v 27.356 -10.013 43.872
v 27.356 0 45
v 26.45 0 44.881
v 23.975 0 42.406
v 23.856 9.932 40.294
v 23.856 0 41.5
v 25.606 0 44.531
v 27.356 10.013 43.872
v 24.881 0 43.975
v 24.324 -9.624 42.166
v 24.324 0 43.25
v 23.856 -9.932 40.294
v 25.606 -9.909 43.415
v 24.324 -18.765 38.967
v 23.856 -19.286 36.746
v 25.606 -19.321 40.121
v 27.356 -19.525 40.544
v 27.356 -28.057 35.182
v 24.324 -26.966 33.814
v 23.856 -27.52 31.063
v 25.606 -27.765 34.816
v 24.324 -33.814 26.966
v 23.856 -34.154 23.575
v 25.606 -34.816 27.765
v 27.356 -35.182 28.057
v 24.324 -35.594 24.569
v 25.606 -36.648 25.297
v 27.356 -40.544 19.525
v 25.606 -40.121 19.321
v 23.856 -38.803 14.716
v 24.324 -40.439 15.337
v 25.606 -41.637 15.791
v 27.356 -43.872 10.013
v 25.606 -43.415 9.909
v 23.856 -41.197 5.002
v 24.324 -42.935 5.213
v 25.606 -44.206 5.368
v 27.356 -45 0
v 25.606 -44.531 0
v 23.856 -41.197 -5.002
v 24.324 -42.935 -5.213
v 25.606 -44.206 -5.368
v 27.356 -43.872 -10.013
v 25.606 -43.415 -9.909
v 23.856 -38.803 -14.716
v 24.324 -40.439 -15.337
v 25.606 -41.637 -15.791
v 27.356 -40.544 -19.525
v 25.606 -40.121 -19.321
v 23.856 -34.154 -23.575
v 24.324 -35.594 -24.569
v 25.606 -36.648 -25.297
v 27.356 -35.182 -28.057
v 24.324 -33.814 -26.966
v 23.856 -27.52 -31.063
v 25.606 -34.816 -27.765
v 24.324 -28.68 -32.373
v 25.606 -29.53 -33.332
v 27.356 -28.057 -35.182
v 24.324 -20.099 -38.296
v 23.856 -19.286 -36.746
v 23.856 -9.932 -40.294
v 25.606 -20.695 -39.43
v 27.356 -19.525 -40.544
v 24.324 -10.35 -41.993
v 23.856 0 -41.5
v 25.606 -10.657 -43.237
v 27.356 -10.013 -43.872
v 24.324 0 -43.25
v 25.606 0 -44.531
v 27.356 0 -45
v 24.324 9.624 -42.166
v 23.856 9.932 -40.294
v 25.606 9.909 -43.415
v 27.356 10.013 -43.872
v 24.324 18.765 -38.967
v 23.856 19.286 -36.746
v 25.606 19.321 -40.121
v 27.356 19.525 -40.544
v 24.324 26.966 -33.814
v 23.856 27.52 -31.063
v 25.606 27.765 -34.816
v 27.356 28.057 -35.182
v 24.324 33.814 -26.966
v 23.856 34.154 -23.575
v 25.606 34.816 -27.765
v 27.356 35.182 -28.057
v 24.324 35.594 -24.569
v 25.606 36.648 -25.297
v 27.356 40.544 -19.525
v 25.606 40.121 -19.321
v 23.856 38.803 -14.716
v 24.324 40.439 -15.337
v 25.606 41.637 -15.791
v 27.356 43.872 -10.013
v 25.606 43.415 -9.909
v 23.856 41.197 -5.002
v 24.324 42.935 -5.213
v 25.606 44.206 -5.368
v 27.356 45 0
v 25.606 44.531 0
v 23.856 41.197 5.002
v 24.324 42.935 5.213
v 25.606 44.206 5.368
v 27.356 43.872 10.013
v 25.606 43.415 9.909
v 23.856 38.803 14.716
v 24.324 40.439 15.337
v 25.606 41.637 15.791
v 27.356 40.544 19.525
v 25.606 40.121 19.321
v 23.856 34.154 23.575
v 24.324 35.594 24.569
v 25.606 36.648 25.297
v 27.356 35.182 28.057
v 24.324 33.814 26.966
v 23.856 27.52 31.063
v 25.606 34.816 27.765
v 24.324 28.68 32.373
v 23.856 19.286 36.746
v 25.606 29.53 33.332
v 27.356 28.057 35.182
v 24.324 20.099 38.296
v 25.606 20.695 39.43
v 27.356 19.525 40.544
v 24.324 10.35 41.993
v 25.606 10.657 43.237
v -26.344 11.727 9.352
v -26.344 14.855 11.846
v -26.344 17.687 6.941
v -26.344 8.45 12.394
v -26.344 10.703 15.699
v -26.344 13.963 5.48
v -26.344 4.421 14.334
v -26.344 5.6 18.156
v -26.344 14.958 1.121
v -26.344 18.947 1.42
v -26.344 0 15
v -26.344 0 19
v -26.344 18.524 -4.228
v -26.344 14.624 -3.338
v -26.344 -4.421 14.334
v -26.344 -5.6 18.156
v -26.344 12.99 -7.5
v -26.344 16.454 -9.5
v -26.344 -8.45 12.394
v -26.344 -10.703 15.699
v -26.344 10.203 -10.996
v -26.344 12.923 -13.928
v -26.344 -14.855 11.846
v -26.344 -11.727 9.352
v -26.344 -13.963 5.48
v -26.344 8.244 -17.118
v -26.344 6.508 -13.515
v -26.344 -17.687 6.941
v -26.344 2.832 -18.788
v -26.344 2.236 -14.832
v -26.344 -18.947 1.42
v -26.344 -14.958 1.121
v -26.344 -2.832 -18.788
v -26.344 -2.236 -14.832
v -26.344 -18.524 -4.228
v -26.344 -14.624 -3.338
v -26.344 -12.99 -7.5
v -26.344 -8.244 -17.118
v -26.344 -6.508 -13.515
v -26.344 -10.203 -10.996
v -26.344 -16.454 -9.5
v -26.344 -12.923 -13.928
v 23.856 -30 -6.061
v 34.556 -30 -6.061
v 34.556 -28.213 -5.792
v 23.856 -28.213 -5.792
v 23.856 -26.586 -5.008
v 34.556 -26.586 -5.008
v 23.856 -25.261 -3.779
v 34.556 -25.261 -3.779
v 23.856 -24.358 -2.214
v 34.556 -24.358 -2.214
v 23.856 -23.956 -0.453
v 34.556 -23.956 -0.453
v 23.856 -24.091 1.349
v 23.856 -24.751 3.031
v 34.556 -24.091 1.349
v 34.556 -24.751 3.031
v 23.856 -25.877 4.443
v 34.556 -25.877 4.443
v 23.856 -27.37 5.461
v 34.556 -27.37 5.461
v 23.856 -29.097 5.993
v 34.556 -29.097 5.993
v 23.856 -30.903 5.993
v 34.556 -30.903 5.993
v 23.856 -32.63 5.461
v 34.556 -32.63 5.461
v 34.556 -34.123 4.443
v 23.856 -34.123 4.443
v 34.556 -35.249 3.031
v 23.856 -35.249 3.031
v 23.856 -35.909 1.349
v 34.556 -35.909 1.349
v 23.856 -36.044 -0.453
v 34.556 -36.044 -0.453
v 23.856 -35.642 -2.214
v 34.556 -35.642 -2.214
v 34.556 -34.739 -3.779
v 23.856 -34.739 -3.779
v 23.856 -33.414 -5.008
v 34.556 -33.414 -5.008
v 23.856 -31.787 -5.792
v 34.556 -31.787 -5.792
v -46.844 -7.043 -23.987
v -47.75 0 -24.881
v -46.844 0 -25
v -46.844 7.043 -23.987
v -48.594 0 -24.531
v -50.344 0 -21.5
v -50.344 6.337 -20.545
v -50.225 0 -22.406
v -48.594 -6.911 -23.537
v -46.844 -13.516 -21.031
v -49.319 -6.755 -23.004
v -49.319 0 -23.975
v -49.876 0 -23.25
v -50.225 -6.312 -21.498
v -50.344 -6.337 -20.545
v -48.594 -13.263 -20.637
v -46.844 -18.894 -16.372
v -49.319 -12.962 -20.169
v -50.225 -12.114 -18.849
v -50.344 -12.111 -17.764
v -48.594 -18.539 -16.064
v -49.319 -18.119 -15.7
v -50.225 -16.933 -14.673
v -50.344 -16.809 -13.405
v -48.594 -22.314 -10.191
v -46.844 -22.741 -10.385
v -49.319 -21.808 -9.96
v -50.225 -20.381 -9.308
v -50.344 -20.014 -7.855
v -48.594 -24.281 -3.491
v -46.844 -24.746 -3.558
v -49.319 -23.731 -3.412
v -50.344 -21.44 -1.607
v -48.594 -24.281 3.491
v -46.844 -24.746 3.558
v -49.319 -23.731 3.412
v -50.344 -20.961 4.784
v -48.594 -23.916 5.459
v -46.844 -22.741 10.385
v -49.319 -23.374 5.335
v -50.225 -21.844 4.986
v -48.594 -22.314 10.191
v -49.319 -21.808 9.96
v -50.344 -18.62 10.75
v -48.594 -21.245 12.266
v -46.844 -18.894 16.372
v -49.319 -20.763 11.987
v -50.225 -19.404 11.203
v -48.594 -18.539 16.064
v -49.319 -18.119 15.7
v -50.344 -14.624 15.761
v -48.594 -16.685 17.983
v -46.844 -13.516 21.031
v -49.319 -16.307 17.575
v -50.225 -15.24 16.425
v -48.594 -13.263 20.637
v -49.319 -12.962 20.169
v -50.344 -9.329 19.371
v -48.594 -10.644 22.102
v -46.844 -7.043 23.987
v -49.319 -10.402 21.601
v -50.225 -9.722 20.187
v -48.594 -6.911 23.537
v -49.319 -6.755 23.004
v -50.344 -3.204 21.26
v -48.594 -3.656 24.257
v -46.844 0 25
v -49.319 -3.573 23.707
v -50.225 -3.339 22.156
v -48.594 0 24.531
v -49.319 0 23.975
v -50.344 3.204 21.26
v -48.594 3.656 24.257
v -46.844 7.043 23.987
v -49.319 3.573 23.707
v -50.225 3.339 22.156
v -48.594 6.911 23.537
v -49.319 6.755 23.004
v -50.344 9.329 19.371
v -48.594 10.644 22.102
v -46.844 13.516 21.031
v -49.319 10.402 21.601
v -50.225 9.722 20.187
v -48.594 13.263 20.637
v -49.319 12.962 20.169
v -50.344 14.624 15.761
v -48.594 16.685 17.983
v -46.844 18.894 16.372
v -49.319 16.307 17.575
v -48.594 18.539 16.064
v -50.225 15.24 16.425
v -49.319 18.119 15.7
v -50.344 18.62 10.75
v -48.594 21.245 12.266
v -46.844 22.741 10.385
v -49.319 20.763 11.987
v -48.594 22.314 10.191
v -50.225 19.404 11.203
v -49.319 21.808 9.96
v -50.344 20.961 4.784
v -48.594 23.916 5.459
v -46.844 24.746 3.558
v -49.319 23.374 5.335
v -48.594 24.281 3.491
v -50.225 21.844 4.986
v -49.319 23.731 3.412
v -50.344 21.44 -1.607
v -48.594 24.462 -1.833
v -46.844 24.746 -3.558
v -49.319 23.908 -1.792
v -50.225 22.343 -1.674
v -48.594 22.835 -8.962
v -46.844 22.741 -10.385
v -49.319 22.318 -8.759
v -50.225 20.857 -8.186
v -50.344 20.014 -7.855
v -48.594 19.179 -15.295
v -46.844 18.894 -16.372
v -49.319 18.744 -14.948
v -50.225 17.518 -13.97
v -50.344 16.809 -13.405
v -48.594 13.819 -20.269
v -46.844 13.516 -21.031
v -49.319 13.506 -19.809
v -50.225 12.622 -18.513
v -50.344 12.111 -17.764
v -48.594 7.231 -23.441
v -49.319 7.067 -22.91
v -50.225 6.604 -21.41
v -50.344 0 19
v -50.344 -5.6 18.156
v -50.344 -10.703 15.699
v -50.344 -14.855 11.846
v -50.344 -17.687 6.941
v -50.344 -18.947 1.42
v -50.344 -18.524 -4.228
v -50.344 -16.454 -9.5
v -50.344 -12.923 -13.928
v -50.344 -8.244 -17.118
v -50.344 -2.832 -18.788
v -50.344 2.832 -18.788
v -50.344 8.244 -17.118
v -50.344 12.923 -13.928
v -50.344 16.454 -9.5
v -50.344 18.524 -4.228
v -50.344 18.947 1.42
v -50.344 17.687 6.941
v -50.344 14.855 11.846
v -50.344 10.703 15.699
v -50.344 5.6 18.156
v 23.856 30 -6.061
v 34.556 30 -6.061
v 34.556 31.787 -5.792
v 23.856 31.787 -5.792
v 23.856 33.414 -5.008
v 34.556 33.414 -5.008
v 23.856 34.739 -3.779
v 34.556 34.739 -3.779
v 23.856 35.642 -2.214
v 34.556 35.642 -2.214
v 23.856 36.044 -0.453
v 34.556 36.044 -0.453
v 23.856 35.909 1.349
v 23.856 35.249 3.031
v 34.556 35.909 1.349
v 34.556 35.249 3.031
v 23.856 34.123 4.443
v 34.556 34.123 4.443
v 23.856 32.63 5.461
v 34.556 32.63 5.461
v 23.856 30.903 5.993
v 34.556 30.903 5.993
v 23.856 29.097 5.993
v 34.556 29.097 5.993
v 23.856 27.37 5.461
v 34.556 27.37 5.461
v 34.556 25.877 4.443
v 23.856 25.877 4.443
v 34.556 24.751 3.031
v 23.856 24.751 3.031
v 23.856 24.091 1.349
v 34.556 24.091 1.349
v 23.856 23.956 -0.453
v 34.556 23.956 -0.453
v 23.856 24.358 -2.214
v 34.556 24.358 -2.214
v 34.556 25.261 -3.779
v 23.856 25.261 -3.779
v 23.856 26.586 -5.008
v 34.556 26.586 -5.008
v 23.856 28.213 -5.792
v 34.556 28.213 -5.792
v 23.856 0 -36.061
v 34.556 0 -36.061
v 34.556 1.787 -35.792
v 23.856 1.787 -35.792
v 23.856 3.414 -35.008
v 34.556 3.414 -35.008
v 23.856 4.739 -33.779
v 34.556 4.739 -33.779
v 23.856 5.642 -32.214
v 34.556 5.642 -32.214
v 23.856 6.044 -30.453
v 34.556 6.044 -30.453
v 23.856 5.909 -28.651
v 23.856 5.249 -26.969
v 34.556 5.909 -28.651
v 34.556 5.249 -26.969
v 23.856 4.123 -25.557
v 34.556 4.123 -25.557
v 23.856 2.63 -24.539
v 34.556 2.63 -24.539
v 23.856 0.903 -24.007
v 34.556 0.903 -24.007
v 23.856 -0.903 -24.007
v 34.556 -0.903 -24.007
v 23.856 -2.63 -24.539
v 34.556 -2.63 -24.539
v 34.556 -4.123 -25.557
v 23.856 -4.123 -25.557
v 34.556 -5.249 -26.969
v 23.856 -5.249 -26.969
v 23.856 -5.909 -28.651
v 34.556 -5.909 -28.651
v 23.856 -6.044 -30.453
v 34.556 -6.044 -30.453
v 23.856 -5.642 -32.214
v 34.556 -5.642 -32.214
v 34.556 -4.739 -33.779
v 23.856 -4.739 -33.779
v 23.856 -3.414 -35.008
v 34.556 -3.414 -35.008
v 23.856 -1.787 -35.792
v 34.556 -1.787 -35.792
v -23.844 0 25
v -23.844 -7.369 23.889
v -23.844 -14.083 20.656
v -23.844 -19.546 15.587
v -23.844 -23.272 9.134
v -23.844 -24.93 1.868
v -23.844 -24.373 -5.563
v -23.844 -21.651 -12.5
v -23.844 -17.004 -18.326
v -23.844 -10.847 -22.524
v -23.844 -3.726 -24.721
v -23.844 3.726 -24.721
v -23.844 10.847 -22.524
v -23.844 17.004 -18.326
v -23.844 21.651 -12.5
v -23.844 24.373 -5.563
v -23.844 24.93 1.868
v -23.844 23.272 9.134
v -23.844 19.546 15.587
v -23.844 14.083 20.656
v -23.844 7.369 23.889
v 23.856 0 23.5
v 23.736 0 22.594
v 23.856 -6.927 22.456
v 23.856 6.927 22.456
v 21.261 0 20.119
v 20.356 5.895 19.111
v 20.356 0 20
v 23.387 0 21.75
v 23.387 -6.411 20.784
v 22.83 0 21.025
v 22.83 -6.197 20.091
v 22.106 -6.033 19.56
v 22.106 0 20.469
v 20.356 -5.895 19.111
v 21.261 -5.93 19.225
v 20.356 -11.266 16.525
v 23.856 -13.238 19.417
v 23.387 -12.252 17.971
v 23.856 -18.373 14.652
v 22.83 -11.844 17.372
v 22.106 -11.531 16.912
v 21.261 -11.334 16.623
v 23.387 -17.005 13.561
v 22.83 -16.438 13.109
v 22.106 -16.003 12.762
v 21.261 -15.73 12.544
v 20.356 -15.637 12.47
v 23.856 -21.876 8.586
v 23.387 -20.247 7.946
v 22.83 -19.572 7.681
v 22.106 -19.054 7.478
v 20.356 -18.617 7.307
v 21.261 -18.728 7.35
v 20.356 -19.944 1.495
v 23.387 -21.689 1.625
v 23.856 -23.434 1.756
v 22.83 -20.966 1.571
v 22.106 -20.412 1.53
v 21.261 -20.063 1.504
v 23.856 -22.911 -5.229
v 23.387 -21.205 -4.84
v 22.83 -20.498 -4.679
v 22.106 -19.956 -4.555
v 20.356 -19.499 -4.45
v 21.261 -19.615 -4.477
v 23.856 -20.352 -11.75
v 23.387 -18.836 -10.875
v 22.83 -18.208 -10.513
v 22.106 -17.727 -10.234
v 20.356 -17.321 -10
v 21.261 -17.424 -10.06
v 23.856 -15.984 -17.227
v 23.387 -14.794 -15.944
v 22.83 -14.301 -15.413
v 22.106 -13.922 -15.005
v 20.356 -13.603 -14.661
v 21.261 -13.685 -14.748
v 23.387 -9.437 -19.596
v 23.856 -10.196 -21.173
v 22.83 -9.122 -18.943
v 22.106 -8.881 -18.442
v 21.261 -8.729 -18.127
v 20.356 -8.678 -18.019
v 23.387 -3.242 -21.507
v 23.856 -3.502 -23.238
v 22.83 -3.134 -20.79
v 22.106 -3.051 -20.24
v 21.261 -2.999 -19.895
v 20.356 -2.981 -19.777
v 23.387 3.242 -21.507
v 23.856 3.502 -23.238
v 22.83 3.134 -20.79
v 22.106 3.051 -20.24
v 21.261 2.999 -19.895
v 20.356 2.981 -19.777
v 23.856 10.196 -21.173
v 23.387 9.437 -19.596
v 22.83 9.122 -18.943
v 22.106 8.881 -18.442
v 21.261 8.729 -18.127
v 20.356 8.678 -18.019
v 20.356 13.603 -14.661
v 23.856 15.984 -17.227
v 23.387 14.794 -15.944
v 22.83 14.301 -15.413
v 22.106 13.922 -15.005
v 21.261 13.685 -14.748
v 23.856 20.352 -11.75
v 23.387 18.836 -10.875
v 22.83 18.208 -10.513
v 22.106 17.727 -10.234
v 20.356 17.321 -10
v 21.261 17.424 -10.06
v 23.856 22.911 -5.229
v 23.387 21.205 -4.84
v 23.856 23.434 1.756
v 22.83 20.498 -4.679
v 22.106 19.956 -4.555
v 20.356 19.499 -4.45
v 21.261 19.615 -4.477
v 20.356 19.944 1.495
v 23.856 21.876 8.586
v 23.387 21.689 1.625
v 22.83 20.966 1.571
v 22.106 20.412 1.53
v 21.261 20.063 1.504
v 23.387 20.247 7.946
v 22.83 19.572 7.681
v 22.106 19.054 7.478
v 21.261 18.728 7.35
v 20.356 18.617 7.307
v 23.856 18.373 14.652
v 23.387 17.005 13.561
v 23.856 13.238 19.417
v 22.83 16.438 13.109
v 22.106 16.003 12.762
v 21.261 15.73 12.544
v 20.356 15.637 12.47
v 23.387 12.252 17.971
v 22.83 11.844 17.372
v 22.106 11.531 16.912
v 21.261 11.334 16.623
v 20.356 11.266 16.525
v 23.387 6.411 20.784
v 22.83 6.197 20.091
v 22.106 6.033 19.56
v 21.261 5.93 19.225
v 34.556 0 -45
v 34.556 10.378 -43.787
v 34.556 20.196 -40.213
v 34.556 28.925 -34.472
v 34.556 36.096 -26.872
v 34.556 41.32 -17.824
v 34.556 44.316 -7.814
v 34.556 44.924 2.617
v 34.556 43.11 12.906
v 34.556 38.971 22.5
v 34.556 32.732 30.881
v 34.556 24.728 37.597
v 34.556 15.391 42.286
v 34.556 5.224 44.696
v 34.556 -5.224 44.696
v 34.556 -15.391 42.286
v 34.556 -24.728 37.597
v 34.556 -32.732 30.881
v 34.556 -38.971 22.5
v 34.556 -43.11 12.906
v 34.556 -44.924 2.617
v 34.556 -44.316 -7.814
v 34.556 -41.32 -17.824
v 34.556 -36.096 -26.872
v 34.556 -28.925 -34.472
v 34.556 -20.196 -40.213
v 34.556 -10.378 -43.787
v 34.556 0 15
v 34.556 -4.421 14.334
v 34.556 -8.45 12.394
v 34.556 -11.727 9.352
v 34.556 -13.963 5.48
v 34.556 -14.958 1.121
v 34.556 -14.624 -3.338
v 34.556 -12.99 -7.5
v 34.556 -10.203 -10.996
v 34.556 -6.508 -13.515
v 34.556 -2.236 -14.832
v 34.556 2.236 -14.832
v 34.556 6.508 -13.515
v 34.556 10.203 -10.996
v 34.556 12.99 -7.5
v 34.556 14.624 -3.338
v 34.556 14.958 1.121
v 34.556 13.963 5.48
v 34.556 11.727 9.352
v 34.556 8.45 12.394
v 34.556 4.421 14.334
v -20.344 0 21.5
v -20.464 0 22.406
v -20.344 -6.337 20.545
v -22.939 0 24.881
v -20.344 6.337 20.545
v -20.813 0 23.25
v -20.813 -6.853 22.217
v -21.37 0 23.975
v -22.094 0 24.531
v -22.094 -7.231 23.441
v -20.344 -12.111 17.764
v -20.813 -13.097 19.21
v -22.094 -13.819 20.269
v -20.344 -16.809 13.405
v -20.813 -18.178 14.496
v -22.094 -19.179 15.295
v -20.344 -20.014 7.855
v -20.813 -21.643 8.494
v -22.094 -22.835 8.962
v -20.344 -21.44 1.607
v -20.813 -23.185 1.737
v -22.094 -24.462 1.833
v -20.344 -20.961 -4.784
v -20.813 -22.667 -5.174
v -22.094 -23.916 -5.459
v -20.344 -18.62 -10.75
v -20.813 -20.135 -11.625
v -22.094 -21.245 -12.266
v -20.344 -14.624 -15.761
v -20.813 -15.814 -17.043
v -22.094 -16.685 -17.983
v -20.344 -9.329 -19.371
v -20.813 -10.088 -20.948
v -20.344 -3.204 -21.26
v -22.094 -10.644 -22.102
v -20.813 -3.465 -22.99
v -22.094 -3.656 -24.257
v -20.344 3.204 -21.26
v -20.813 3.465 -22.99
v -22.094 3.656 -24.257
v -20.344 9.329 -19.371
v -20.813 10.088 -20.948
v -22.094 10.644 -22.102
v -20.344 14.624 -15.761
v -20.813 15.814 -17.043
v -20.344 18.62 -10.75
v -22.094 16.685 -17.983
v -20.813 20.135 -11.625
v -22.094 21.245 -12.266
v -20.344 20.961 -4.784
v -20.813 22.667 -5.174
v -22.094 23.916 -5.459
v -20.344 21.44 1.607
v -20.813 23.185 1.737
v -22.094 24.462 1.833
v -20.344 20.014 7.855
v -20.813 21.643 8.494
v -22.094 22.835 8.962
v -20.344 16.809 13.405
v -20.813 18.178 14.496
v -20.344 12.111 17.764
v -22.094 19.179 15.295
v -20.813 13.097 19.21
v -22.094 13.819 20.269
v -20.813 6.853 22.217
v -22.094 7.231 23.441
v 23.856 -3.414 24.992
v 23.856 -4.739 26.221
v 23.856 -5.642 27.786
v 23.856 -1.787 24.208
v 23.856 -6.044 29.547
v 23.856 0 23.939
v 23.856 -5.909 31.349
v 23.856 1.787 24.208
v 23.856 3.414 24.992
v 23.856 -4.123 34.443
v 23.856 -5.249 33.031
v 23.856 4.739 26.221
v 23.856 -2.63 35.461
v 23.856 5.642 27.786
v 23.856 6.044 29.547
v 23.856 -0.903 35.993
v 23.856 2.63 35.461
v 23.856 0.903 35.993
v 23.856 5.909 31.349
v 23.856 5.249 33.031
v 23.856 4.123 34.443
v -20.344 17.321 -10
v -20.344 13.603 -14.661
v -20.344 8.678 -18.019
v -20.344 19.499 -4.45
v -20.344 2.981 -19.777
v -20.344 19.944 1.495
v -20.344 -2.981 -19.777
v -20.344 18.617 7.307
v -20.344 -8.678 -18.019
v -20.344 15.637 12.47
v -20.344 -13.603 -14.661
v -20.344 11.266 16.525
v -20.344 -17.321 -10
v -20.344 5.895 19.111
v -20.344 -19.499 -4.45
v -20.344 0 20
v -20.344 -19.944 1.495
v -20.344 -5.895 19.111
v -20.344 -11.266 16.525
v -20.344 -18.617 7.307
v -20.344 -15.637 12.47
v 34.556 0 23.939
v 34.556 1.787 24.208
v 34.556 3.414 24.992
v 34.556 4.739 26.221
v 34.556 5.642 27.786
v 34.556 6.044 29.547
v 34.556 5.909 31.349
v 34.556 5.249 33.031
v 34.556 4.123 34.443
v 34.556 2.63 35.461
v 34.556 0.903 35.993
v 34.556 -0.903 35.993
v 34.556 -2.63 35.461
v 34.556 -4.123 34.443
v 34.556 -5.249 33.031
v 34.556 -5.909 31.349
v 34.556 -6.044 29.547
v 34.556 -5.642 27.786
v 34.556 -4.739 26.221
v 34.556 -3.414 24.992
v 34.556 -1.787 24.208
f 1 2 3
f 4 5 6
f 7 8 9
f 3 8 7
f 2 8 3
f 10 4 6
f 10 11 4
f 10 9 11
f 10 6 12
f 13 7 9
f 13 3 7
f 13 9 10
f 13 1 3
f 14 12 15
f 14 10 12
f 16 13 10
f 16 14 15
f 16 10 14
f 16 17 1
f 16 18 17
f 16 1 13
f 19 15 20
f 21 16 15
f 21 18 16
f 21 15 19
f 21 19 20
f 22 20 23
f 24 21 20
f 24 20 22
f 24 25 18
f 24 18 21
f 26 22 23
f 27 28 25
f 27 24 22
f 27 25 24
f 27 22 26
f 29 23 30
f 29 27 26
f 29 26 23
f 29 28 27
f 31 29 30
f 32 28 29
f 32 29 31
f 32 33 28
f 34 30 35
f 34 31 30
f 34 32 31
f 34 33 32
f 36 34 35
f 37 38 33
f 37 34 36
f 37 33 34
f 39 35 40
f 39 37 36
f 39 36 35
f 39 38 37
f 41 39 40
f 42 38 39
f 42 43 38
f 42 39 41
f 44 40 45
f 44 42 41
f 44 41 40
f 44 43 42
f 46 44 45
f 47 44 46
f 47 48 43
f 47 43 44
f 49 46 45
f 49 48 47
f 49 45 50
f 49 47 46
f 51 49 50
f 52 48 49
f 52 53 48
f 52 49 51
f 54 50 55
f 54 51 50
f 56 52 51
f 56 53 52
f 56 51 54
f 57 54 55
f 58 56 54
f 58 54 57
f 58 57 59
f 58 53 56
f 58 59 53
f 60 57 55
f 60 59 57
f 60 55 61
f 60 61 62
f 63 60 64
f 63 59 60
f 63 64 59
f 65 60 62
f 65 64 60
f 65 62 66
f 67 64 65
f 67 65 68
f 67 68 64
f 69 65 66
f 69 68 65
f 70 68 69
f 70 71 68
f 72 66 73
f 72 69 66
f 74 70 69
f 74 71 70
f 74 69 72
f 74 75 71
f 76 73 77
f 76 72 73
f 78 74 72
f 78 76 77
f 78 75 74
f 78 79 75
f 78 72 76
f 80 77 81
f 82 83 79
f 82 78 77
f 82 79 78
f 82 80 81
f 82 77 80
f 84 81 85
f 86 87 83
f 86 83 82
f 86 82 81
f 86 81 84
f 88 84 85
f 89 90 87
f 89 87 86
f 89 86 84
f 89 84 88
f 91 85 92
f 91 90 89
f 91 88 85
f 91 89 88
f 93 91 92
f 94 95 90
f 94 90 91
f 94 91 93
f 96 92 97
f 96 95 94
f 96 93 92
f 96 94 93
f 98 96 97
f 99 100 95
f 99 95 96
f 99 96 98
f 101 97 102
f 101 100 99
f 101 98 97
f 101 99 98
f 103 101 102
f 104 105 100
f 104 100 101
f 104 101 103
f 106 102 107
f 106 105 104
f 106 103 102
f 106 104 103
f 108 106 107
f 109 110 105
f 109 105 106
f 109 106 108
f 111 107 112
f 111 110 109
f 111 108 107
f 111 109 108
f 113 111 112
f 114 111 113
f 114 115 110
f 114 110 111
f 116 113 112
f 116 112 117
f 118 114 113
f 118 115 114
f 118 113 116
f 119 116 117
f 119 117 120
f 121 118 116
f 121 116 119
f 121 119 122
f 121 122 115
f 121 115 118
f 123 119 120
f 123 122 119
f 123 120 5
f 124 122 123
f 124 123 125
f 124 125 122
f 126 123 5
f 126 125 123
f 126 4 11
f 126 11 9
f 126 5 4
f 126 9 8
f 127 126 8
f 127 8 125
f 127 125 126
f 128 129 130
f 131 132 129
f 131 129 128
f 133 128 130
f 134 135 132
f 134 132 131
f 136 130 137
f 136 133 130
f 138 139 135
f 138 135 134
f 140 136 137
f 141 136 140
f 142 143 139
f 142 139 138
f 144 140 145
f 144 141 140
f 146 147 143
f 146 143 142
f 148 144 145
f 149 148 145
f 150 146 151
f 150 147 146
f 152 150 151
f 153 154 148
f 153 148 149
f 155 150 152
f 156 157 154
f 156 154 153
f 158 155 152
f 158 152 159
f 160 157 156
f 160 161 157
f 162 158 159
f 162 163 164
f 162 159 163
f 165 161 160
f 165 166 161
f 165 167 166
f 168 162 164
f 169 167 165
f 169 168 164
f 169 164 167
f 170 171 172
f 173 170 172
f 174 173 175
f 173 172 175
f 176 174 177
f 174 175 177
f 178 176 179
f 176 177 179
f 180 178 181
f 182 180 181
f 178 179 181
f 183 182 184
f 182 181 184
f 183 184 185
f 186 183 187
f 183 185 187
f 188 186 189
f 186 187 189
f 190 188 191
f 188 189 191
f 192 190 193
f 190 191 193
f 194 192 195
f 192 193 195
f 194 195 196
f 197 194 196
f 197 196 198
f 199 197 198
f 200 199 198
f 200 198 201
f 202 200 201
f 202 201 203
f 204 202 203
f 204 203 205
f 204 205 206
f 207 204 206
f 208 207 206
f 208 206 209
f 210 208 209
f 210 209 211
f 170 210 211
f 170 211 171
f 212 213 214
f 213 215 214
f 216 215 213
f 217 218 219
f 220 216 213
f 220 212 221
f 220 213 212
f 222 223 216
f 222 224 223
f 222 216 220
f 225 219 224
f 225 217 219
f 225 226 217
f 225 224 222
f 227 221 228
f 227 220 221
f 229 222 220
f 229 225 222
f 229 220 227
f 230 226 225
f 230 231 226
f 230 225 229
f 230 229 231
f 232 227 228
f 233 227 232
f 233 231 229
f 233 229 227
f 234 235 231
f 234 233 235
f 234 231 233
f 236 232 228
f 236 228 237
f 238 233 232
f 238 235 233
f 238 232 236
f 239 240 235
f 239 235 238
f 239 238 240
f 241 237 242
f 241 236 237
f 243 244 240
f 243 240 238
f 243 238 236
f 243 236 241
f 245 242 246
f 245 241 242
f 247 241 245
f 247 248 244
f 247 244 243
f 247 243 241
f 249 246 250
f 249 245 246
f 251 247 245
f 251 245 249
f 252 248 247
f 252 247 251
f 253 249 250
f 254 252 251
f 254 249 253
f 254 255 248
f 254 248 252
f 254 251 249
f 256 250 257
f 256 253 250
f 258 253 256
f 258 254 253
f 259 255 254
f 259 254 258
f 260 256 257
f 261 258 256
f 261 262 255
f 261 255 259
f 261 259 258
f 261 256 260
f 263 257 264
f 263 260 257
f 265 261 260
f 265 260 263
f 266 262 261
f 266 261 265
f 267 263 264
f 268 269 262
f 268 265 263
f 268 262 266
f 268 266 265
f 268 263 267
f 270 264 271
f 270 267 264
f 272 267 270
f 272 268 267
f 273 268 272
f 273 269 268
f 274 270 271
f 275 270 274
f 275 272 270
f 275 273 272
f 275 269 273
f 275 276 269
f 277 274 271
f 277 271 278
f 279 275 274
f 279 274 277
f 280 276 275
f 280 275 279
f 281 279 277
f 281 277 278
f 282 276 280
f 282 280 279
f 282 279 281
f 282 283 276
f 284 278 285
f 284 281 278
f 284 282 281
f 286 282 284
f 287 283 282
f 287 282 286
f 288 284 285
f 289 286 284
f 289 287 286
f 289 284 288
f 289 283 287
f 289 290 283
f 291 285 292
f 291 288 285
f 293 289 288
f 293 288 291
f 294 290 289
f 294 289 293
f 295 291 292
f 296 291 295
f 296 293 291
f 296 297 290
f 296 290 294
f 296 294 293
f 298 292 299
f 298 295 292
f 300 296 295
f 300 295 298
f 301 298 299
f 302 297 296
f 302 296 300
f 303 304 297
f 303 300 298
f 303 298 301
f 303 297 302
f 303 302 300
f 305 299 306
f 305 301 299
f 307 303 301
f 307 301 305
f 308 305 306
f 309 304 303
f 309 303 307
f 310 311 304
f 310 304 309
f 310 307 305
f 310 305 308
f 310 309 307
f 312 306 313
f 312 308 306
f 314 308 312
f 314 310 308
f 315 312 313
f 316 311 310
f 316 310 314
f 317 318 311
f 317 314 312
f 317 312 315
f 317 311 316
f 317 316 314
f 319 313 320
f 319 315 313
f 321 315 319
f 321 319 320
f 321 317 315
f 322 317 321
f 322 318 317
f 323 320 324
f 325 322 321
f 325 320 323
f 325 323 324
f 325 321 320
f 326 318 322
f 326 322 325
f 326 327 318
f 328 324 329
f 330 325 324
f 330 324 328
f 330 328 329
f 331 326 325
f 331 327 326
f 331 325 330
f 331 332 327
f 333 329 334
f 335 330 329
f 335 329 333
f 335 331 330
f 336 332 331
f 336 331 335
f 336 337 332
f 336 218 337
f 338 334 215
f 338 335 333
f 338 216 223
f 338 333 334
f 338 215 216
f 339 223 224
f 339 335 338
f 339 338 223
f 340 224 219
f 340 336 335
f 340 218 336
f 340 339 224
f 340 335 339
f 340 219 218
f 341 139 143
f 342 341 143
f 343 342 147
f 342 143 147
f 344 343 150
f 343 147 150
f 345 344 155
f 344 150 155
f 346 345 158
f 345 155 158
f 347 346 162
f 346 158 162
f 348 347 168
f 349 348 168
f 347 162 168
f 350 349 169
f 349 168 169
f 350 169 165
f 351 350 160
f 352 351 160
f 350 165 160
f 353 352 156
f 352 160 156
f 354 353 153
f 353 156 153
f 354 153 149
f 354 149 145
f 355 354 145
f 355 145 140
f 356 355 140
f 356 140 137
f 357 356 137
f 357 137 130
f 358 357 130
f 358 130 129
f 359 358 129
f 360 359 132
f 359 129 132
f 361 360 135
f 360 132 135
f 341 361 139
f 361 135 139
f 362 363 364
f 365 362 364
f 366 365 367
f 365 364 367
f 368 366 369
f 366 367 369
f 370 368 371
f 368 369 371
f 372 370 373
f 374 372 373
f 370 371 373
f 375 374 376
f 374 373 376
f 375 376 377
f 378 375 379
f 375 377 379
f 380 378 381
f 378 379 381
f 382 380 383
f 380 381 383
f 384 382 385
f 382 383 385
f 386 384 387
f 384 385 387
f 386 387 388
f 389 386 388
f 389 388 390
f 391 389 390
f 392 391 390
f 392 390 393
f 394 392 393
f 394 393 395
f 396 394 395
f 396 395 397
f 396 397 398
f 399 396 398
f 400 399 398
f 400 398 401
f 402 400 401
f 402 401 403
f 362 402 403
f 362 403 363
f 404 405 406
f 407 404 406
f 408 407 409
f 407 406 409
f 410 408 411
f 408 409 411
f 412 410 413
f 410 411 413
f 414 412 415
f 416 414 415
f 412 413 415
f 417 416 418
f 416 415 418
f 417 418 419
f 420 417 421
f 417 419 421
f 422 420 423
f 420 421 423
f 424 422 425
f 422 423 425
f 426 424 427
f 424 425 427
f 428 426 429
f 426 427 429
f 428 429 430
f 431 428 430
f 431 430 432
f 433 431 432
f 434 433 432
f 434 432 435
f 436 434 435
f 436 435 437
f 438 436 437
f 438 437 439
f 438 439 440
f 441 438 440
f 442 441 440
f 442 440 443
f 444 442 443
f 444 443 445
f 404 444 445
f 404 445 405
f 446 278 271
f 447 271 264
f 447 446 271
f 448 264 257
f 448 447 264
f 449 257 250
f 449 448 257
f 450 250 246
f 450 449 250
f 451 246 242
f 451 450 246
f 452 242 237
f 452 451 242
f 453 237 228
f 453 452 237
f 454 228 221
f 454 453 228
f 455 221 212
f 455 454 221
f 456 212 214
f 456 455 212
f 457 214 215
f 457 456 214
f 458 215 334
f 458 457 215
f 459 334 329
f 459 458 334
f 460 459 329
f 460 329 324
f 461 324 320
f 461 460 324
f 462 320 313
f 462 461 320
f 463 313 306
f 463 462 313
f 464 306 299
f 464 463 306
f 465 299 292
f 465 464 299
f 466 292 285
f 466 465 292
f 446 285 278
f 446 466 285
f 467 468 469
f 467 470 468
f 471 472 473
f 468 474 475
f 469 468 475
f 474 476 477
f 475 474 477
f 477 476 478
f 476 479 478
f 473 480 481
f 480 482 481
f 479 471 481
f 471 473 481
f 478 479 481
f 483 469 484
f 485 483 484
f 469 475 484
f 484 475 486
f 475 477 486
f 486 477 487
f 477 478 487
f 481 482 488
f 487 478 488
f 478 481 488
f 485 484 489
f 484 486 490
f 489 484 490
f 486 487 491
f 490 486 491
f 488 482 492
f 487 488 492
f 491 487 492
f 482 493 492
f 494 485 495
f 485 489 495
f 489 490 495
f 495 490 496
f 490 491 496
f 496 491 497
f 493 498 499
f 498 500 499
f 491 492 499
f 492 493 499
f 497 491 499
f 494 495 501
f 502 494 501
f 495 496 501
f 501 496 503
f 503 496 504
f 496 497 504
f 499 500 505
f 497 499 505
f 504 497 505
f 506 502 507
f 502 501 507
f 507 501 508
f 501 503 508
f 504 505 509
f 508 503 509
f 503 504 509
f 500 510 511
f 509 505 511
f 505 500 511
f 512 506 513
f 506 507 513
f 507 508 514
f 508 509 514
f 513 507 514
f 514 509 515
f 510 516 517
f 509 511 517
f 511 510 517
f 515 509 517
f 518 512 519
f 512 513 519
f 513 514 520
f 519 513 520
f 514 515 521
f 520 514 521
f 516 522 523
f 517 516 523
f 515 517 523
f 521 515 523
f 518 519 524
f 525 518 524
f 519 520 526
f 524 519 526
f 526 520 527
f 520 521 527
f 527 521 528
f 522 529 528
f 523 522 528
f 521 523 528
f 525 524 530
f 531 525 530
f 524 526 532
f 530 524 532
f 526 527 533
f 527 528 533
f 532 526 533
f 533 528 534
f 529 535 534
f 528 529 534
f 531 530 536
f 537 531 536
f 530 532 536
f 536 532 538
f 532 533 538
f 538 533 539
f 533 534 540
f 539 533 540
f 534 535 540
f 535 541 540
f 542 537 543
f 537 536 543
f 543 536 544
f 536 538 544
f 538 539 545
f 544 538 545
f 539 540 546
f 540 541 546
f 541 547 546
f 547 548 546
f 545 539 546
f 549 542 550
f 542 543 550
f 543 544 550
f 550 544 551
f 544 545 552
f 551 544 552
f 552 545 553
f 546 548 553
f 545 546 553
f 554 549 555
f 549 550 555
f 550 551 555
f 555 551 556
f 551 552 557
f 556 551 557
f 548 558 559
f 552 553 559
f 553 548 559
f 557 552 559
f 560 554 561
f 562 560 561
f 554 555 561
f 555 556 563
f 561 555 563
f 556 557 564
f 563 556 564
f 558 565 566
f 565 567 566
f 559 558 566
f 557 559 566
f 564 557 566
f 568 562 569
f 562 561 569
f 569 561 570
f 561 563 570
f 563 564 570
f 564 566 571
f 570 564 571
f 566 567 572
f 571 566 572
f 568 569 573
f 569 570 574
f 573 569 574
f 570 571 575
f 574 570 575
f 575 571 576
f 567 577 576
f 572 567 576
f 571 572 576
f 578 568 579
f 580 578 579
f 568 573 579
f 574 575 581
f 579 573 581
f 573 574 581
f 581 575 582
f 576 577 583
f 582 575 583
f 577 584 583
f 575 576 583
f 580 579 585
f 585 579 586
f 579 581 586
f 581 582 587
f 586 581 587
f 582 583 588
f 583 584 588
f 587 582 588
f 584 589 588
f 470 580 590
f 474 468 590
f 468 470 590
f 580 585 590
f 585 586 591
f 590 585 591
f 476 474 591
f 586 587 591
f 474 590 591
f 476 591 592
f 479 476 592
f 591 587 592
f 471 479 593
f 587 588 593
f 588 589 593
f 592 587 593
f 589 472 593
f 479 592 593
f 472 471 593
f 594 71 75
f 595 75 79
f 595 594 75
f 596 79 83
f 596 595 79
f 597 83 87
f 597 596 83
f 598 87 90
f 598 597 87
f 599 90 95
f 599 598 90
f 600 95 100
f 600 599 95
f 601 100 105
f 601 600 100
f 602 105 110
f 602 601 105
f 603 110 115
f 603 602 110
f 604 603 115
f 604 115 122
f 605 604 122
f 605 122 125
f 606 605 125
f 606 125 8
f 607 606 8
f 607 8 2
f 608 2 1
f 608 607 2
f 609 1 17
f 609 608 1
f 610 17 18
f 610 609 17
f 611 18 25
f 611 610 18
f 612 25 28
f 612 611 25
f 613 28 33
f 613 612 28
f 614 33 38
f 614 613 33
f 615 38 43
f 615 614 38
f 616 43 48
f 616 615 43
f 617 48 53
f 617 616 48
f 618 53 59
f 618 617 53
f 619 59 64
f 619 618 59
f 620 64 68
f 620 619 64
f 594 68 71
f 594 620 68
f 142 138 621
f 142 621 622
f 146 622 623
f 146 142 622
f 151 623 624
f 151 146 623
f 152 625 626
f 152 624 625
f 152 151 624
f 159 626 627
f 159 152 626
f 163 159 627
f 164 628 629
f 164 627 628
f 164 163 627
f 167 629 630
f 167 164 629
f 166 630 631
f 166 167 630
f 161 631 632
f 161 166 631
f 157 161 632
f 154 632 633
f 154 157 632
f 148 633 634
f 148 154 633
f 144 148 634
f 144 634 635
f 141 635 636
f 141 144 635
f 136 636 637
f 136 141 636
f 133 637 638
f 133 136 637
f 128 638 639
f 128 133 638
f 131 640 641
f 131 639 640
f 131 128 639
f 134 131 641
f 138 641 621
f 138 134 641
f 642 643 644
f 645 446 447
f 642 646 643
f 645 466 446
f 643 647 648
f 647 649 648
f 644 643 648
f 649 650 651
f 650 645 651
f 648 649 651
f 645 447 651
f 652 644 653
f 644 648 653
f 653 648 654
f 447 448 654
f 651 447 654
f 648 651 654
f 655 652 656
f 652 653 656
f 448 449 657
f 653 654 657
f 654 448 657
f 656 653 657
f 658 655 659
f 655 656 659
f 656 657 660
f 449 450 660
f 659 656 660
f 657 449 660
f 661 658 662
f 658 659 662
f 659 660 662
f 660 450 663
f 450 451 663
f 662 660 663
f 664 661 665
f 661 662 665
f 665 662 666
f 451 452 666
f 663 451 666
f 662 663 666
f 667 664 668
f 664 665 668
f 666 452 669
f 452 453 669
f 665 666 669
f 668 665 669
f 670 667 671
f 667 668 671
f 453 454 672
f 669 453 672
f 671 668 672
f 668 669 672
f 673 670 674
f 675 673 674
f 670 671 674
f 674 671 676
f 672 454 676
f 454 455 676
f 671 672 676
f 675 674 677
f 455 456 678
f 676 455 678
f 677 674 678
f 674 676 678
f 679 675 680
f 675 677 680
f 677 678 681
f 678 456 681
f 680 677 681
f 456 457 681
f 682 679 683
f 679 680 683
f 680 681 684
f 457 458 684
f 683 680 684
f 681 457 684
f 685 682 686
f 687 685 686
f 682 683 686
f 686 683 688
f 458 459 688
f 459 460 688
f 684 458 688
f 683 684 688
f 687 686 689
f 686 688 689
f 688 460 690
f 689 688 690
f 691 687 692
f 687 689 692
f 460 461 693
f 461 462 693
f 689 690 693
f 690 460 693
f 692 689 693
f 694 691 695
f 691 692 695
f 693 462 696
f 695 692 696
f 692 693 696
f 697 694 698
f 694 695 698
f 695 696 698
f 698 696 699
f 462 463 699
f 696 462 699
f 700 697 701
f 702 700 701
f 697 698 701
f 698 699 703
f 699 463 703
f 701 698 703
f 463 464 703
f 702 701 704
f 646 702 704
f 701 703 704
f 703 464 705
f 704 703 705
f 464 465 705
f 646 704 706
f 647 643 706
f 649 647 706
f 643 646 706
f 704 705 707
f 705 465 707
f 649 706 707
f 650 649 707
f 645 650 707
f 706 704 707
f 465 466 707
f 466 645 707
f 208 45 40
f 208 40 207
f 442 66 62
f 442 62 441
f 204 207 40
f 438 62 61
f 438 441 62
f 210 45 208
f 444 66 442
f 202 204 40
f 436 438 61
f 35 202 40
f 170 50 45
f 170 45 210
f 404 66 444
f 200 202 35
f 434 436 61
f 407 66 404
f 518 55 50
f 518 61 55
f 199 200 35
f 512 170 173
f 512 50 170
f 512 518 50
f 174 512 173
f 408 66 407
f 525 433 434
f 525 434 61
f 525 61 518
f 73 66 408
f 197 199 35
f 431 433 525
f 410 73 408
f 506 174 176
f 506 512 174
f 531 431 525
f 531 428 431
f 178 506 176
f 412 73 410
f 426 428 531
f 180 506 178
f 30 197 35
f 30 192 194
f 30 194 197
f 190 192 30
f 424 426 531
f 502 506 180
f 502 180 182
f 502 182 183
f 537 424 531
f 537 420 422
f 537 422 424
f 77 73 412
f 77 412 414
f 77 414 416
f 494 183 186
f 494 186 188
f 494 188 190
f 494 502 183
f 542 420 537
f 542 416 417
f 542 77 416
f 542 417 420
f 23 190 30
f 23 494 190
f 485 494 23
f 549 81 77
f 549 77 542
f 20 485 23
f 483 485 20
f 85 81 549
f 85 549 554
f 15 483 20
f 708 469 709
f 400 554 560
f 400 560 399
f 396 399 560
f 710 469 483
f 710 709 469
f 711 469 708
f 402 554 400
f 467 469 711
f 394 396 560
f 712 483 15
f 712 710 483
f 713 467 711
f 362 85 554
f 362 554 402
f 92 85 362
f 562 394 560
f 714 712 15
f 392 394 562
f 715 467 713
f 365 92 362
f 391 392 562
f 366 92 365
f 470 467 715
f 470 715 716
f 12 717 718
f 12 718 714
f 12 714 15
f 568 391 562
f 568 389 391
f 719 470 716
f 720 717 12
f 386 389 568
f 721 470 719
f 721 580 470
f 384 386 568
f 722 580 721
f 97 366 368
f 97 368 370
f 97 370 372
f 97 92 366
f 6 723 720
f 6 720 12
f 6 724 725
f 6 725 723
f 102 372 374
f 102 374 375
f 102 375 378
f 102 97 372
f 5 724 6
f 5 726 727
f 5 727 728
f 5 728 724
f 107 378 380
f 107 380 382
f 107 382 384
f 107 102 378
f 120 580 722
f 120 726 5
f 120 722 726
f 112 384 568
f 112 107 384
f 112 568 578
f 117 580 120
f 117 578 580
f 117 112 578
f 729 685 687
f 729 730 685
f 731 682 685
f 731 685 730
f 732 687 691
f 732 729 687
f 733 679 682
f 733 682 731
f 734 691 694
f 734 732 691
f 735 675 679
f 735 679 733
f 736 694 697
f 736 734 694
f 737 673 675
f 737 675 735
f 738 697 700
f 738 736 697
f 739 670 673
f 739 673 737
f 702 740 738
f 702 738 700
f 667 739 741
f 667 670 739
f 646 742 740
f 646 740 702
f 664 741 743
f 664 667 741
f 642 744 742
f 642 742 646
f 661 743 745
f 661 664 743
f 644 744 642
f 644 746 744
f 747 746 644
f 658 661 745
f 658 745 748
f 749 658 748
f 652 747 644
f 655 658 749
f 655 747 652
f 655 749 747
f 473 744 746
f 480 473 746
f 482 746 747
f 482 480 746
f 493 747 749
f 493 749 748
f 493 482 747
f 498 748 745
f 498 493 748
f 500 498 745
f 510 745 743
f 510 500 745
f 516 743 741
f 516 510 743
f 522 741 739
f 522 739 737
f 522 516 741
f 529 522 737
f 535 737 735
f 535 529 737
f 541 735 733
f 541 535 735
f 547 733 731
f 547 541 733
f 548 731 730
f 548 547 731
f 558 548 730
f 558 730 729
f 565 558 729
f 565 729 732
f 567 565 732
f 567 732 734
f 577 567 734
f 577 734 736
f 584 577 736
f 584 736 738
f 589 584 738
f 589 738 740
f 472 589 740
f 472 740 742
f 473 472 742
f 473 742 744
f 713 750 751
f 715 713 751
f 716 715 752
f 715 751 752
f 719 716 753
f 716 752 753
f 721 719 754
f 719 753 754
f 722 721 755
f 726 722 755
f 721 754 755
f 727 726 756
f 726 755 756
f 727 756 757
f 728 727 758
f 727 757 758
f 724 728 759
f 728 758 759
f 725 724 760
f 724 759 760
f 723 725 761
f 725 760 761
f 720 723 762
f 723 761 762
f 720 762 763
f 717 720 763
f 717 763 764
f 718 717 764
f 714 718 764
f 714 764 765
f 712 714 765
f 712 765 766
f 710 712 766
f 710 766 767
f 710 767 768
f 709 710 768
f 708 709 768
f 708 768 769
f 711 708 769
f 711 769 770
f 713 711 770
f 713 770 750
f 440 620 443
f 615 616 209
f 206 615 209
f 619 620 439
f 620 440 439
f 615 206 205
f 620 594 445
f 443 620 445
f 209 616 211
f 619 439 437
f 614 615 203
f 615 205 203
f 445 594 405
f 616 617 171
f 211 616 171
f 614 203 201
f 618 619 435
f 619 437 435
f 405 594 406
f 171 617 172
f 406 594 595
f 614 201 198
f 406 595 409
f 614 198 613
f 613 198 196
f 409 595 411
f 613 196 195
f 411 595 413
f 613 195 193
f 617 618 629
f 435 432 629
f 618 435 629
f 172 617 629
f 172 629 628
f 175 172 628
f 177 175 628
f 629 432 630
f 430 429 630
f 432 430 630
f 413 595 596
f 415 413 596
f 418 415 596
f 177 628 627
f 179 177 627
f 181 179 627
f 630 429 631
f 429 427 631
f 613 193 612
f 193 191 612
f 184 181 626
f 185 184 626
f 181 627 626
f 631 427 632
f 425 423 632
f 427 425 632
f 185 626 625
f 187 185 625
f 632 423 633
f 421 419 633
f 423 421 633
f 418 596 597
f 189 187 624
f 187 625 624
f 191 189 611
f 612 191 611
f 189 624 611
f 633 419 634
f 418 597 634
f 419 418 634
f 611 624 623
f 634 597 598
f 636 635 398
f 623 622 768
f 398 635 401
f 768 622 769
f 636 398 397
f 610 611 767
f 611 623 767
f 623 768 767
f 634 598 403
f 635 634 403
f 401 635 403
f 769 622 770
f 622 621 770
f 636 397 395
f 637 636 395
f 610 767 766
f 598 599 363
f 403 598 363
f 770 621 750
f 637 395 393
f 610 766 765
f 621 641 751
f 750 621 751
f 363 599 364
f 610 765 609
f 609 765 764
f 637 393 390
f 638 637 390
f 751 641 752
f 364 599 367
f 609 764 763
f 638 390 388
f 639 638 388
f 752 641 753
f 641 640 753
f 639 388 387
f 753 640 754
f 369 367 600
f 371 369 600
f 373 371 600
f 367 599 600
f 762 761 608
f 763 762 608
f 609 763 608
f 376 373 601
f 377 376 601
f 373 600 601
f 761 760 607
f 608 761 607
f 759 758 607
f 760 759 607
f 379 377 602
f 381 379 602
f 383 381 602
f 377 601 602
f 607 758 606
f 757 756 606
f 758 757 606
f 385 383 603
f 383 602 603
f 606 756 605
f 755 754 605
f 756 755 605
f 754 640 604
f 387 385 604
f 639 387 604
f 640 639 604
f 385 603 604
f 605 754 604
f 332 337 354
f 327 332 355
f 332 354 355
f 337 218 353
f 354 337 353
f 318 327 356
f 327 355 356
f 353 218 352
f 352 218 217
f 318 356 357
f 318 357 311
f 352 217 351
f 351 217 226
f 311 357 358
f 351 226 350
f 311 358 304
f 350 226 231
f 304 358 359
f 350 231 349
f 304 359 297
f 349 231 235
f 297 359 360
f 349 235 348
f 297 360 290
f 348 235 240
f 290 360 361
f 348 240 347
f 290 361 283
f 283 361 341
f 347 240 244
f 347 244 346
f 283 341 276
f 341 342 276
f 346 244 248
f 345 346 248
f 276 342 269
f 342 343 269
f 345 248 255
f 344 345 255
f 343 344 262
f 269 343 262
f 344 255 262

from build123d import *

# Parameters (mm, degrees)
SKETCH2_W          = 10.7
SKETCH2_H          = 7.5
CUT_EXTRUDE2_REACH = 108.104
SKETCH5_R          = 6.061151683
FILLET2_R          = 3.5
FILLET3_R          = 3.5


with BuildPart() as part:
    # Sketch2 → Revolve5 (revolve)
    with BuildSketch(Plane(origin=(0, 0, 0), x_dir=(1, 0, 0), z_dir=(0, 1, 0))):
        Polygon((-50.344444444, 25), (-50.344444444, 19), (-26.344444444, 19), (-26.344444444, 15), (34.555555556, 15), (34.555555556, 25), (23.855555556, 25), (23.855555556, 20), (-20.344444444, 20), (-20.344444444, 25), align=None)
        Polygon((-26.344444444, -15), (-26.344444444, -19), (-50.344444444, -19), (-50.344444444, -25), (-20.344444444, -25), (-20.344444444, -20), (23.855555556, -20), (23.855555556, -45), (34.555555556, -45), (34.555555556, -15), align=None)
        with Locations((29.205555556, 41.25)):
            Rectangle(SKETCH2_W, SKETCH2_H)
    revolve(axis=Axis((-47.361111111, 0, 0), (1, 0, 0)))

    # Sketch5 → Cut-Extrude2 (cut, up to next)
    with BuildSketch(Plane(origin=(34.555555556, 0, 0), x_dir=(0, 0, -1), z_dir=(1, 0, 0)), mode=Mode.PRIVATE) as cut_extrude2_sk1:
        with Locations((0, 30)):
            Circle(SKETCH5_R)
    cut_extrude2_tool1 = extrude(cut_extrude2_sk1.sketch, amount=-CUT_EXTRUDE2_REACH, mode=Mode.PRIVATE) & part.part
    # Sketch5 → Cut-Extrude2 (cut, up to next)
    with BuildSketch(Plane(origin=(34.555555556, 0, 0), x_dir=(0, 0, -1), z_dir=(1, 0, 0)), mode=Mode.PRIVATE) as cut_extrude2_sk2:
        with Locations((30, 0)):
            Circle(SKETCH5_R)
    cut_extrude2_tool2 = extrude(cut_extrude2_sk2.sketch, amount=-CUT_EXTRUDE2_REACH, mode=Mode.PRIVATE) & part.part
    # Sketch5 → Cut-Extrude2 (cut, up to next)
    with BuildSketch(Plane(origin=(34.555555556, 0, 0), x_dir=(0, 0, -1), z_dir=(1, 0, 0)), mode=Mode.PRIVATE) as cut_extrude2_sk3:
        with Locations((0, -30)):
            Circle(SKETCH5_R)
    cut_extrude2_tool3 = extrude(cut_extrude2_sk3.sketch, amount=-CUT_EXTRUDE2_REACH, mode=Mode.PRIVATE) & part.part
    # Sketch5 → Cut-Extrude2 (cut, up to next)
    with BuildSketch(Plane(origin=(34.555555556, 0, 0), x_dir=(0, 0, -1), z_dir=(1, 0, 0)), mode=Mode.PRIVATE) as cut_extrude2_sk4:
        with Locations((-30, 0)):
            Circle(SKETCH5_R)
    cut_extrude2_tool4 = extrude(cut_extrude2_sk4.sketch, amount=-CUT_EXTRUDE2_REACH, mode=Mode.PRIVATE) & part.part
    add(cut_extrude2_tool1.solids().sort_by_distance((34.555556, 30, 0))[0], mode=Mode.SUBTRACT)
    add(cut_extrude2_tool2.solids().sort_by_distance((34.555556, 0, -30))[0], mode=Mode.SUBTRACT)
    add(cut_extrude2_tool3.solids().sort_by_distance((34.555556, -30, 0))[0], mode=Mode.SUBTRACT)
    add(cut_extrude2_tool4.solids().sort_by_distance((34.555556, 0, 30))[0], mode=Mode.SUBTRACT)

    # Fillet2
    fillet2_edges = [part.edges().sort_by_distance(p)[0] for p in [
        (-20.344444444, 0, 25),
    ]]
    fillet(fillet2_edges, radius=FILLET2_R)

    # Fillet3
    fillet3_edges = [part.edges().sort_by_distance(p)[0] for p in [
        (23.855555556, 0, -45),
        (23.855555556, 0, 20),
        (-50.344444444, 0, 25),
    ]]
    fillet(fillet3_edges, radius=FILLET3_R)


solid = part.part
